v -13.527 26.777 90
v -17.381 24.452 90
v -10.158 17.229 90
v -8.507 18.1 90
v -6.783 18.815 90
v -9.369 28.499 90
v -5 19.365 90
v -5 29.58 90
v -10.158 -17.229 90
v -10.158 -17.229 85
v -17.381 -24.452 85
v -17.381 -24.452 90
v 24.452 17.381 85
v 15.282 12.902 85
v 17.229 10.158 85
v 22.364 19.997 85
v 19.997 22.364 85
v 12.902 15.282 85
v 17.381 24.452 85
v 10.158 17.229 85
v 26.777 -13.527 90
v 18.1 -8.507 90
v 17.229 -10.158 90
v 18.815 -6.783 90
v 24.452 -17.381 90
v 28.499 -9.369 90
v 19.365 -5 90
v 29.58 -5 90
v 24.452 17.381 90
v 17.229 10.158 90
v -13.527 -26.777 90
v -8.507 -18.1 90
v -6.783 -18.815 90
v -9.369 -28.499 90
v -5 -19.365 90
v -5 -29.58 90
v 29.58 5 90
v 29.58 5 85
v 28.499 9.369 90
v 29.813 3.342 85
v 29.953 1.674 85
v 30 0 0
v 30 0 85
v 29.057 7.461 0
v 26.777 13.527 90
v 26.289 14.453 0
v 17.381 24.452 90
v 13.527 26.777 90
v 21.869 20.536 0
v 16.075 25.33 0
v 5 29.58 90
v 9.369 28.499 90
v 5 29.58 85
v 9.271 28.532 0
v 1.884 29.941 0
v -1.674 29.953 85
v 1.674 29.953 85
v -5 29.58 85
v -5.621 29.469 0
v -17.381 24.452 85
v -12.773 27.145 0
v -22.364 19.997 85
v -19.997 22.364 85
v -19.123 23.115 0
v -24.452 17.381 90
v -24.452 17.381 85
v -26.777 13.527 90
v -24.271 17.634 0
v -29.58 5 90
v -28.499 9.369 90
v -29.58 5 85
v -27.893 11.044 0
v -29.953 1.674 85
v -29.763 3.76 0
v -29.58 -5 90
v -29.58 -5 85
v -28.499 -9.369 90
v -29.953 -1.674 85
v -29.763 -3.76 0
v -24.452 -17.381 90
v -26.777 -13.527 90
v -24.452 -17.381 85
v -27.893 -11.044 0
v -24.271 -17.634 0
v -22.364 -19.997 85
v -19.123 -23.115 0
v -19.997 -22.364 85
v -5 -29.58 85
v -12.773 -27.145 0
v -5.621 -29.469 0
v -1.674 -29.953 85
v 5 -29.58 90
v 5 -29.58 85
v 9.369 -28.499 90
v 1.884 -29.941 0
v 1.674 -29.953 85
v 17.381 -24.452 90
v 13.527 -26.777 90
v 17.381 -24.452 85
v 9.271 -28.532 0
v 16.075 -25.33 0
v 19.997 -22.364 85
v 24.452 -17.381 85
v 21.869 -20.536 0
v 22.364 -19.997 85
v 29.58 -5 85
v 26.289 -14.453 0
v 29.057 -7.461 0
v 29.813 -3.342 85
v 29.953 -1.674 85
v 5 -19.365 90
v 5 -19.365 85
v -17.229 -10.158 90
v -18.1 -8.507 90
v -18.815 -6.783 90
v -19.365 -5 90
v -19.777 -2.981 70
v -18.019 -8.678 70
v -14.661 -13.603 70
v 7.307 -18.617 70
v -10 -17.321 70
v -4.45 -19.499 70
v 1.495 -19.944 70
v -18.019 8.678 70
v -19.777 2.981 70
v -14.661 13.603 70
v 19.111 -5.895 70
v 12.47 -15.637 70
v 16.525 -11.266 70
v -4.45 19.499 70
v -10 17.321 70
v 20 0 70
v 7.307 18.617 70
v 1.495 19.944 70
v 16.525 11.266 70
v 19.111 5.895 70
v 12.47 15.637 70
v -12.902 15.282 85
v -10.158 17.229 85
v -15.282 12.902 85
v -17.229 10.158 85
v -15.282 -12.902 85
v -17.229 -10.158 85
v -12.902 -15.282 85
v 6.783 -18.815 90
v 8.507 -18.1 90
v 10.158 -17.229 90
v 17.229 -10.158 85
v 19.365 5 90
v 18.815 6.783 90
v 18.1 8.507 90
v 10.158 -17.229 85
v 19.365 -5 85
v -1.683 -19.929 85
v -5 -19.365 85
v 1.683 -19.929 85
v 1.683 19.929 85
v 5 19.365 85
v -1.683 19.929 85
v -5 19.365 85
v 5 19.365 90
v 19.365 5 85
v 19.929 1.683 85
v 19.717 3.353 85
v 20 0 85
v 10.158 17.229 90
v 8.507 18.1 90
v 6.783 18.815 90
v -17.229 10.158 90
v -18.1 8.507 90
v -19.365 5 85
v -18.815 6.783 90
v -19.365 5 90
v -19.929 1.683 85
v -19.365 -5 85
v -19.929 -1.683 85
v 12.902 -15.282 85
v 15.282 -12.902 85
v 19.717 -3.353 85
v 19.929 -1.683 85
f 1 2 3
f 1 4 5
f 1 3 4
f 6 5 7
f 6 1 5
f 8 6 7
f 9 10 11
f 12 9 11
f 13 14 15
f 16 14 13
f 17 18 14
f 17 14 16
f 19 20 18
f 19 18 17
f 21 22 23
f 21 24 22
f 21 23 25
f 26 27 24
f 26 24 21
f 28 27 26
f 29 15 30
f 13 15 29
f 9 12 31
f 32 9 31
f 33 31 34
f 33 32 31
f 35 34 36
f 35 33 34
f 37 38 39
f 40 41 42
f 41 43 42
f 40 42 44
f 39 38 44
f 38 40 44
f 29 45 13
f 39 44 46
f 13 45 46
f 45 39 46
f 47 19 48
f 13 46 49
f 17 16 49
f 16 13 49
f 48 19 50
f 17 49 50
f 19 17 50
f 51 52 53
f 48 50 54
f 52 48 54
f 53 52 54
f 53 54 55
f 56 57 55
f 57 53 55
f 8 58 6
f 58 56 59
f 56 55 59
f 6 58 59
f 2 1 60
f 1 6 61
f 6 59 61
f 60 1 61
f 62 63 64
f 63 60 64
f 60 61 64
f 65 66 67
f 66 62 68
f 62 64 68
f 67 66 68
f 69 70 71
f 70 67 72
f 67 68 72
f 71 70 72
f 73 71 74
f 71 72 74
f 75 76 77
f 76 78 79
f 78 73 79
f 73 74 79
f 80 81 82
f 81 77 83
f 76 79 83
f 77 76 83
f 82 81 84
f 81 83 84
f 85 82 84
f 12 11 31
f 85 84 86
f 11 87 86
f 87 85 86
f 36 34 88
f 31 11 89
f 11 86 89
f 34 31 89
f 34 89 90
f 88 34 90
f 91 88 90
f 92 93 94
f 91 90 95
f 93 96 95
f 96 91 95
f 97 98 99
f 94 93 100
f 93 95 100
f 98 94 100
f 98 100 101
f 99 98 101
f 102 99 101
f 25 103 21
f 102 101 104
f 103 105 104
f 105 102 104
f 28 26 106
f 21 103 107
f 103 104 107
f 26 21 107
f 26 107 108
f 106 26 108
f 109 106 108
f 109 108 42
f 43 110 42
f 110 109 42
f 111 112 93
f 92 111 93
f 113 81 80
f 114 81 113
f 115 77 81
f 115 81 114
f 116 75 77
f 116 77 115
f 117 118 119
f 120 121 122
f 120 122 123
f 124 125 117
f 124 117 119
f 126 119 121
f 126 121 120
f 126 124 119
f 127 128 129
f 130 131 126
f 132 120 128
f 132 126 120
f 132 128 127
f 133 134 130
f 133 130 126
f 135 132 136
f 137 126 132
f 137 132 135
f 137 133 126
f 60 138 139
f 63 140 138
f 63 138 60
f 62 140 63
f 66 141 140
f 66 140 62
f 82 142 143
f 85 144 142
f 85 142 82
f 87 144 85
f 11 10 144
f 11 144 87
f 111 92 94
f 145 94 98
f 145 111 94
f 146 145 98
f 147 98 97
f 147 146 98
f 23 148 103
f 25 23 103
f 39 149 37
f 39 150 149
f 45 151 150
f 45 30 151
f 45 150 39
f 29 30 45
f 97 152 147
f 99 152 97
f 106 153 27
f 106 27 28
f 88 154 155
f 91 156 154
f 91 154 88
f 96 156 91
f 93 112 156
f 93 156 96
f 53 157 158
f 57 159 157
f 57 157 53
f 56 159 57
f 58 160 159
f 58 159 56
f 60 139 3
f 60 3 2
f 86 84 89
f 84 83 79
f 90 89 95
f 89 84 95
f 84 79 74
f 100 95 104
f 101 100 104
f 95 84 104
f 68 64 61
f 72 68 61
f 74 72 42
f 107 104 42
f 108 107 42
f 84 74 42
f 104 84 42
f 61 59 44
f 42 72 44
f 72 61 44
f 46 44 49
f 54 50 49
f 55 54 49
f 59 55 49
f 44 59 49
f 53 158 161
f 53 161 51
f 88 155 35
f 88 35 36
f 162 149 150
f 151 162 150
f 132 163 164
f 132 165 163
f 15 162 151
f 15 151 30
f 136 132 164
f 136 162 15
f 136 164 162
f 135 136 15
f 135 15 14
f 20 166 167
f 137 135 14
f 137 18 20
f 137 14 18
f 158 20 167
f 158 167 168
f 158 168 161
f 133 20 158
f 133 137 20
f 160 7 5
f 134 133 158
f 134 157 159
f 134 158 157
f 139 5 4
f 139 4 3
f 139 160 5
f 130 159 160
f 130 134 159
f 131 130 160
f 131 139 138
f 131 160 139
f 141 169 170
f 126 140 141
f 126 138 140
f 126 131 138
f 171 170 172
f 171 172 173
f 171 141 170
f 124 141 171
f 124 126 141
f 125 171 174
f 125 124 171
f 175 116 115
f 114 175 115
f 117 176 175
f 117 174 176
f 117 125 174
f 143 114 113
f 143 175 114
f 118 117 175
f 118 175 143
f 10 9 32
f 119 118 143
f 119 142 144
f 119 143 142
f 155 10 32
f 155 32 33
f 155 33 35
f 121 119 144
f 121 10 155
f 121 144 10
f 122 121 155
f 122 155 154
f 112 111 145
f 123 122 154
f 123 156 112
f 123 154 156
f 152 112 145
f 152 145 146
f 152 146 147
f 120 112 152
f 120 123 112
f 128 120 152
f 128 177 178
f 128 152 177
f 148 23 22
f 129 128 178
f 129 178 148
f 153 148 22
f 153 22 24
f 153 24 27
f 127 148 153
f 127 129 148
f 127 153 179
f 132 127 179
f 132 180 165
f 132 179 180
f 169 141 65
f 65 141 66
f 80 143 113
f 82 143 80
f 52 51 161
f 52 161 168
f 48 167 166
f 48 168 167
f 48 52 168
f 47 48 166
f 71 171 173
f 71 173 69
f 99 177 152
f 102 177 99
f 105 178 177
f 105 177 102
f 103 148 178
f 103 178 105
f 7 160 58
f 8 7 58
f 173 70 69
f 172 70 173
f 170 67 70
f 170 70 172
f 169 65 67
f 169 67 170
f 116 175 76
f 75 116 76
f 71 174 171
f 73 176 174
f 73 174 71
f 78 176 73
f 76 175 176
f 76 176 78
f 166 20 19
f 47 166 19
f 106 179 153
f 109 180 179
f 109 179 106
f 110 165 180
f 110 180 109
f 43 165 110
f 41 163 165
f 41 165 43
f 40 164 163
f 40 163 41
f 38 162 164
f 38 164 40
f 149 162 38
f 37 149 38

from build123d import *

# Parameters (mm, degrees)
BOX_W             = 15
BOX_H             = 10
BOX_DEPTH         = 10
ARRAY_COUNT       = 8
CYLINDER001_R     = 20
CYLINDER001_DEPTH = 20
CYLINDER_R        = 30
CYLINDER_DEPTH    = 90


with BuildPart() as array:
    # Box → Box (new body)
    with BuildSketch(Plane(origin=(19, -5, 85), x_dir=(1, 0, 0), z_dir=(0, 0, 1))):
        with Locations((7.5, 5)):
            Rectangle(BOX_W, BOX_H)
    extrude(amount=BOX_DEPTH)

    # Array: Array ×8 about axis
    array_axis = Axis((0, 0, 0), (0, 0, 1))


with BuildPart() as array_1:
    add(array.part)
    for i in range(1, ARRAY_COUNT):
        add(array.part.rotate(array_axis, i * 360 / ARRAY_COUNT))


with BuildPart() as part_de_dalt:
    # Cylinder001 → Cylinder001 (new body)
    with BuildSketch(Plane.XY.offset(70)):
        Circle(CYLINDER001_R)
    extrude(amount=CYLINDER001_DEPTH)


with BuildPart() as cut001:
    # Cylinder → Cylinder (new body)
    with BuildSketch(Plane.XY):
        Circle(CYLINDER_R)
    extrude(amount=CYLINDER_DEPTH)

    # Cut: cut part_de_dalt
    add(part_de_dalt.part, mode=Mode.SUBTRACT)

    # Cut001: cut Array
    add(array_1.part, mode=Mode.SUBTRACT)


solid = cut001.part
